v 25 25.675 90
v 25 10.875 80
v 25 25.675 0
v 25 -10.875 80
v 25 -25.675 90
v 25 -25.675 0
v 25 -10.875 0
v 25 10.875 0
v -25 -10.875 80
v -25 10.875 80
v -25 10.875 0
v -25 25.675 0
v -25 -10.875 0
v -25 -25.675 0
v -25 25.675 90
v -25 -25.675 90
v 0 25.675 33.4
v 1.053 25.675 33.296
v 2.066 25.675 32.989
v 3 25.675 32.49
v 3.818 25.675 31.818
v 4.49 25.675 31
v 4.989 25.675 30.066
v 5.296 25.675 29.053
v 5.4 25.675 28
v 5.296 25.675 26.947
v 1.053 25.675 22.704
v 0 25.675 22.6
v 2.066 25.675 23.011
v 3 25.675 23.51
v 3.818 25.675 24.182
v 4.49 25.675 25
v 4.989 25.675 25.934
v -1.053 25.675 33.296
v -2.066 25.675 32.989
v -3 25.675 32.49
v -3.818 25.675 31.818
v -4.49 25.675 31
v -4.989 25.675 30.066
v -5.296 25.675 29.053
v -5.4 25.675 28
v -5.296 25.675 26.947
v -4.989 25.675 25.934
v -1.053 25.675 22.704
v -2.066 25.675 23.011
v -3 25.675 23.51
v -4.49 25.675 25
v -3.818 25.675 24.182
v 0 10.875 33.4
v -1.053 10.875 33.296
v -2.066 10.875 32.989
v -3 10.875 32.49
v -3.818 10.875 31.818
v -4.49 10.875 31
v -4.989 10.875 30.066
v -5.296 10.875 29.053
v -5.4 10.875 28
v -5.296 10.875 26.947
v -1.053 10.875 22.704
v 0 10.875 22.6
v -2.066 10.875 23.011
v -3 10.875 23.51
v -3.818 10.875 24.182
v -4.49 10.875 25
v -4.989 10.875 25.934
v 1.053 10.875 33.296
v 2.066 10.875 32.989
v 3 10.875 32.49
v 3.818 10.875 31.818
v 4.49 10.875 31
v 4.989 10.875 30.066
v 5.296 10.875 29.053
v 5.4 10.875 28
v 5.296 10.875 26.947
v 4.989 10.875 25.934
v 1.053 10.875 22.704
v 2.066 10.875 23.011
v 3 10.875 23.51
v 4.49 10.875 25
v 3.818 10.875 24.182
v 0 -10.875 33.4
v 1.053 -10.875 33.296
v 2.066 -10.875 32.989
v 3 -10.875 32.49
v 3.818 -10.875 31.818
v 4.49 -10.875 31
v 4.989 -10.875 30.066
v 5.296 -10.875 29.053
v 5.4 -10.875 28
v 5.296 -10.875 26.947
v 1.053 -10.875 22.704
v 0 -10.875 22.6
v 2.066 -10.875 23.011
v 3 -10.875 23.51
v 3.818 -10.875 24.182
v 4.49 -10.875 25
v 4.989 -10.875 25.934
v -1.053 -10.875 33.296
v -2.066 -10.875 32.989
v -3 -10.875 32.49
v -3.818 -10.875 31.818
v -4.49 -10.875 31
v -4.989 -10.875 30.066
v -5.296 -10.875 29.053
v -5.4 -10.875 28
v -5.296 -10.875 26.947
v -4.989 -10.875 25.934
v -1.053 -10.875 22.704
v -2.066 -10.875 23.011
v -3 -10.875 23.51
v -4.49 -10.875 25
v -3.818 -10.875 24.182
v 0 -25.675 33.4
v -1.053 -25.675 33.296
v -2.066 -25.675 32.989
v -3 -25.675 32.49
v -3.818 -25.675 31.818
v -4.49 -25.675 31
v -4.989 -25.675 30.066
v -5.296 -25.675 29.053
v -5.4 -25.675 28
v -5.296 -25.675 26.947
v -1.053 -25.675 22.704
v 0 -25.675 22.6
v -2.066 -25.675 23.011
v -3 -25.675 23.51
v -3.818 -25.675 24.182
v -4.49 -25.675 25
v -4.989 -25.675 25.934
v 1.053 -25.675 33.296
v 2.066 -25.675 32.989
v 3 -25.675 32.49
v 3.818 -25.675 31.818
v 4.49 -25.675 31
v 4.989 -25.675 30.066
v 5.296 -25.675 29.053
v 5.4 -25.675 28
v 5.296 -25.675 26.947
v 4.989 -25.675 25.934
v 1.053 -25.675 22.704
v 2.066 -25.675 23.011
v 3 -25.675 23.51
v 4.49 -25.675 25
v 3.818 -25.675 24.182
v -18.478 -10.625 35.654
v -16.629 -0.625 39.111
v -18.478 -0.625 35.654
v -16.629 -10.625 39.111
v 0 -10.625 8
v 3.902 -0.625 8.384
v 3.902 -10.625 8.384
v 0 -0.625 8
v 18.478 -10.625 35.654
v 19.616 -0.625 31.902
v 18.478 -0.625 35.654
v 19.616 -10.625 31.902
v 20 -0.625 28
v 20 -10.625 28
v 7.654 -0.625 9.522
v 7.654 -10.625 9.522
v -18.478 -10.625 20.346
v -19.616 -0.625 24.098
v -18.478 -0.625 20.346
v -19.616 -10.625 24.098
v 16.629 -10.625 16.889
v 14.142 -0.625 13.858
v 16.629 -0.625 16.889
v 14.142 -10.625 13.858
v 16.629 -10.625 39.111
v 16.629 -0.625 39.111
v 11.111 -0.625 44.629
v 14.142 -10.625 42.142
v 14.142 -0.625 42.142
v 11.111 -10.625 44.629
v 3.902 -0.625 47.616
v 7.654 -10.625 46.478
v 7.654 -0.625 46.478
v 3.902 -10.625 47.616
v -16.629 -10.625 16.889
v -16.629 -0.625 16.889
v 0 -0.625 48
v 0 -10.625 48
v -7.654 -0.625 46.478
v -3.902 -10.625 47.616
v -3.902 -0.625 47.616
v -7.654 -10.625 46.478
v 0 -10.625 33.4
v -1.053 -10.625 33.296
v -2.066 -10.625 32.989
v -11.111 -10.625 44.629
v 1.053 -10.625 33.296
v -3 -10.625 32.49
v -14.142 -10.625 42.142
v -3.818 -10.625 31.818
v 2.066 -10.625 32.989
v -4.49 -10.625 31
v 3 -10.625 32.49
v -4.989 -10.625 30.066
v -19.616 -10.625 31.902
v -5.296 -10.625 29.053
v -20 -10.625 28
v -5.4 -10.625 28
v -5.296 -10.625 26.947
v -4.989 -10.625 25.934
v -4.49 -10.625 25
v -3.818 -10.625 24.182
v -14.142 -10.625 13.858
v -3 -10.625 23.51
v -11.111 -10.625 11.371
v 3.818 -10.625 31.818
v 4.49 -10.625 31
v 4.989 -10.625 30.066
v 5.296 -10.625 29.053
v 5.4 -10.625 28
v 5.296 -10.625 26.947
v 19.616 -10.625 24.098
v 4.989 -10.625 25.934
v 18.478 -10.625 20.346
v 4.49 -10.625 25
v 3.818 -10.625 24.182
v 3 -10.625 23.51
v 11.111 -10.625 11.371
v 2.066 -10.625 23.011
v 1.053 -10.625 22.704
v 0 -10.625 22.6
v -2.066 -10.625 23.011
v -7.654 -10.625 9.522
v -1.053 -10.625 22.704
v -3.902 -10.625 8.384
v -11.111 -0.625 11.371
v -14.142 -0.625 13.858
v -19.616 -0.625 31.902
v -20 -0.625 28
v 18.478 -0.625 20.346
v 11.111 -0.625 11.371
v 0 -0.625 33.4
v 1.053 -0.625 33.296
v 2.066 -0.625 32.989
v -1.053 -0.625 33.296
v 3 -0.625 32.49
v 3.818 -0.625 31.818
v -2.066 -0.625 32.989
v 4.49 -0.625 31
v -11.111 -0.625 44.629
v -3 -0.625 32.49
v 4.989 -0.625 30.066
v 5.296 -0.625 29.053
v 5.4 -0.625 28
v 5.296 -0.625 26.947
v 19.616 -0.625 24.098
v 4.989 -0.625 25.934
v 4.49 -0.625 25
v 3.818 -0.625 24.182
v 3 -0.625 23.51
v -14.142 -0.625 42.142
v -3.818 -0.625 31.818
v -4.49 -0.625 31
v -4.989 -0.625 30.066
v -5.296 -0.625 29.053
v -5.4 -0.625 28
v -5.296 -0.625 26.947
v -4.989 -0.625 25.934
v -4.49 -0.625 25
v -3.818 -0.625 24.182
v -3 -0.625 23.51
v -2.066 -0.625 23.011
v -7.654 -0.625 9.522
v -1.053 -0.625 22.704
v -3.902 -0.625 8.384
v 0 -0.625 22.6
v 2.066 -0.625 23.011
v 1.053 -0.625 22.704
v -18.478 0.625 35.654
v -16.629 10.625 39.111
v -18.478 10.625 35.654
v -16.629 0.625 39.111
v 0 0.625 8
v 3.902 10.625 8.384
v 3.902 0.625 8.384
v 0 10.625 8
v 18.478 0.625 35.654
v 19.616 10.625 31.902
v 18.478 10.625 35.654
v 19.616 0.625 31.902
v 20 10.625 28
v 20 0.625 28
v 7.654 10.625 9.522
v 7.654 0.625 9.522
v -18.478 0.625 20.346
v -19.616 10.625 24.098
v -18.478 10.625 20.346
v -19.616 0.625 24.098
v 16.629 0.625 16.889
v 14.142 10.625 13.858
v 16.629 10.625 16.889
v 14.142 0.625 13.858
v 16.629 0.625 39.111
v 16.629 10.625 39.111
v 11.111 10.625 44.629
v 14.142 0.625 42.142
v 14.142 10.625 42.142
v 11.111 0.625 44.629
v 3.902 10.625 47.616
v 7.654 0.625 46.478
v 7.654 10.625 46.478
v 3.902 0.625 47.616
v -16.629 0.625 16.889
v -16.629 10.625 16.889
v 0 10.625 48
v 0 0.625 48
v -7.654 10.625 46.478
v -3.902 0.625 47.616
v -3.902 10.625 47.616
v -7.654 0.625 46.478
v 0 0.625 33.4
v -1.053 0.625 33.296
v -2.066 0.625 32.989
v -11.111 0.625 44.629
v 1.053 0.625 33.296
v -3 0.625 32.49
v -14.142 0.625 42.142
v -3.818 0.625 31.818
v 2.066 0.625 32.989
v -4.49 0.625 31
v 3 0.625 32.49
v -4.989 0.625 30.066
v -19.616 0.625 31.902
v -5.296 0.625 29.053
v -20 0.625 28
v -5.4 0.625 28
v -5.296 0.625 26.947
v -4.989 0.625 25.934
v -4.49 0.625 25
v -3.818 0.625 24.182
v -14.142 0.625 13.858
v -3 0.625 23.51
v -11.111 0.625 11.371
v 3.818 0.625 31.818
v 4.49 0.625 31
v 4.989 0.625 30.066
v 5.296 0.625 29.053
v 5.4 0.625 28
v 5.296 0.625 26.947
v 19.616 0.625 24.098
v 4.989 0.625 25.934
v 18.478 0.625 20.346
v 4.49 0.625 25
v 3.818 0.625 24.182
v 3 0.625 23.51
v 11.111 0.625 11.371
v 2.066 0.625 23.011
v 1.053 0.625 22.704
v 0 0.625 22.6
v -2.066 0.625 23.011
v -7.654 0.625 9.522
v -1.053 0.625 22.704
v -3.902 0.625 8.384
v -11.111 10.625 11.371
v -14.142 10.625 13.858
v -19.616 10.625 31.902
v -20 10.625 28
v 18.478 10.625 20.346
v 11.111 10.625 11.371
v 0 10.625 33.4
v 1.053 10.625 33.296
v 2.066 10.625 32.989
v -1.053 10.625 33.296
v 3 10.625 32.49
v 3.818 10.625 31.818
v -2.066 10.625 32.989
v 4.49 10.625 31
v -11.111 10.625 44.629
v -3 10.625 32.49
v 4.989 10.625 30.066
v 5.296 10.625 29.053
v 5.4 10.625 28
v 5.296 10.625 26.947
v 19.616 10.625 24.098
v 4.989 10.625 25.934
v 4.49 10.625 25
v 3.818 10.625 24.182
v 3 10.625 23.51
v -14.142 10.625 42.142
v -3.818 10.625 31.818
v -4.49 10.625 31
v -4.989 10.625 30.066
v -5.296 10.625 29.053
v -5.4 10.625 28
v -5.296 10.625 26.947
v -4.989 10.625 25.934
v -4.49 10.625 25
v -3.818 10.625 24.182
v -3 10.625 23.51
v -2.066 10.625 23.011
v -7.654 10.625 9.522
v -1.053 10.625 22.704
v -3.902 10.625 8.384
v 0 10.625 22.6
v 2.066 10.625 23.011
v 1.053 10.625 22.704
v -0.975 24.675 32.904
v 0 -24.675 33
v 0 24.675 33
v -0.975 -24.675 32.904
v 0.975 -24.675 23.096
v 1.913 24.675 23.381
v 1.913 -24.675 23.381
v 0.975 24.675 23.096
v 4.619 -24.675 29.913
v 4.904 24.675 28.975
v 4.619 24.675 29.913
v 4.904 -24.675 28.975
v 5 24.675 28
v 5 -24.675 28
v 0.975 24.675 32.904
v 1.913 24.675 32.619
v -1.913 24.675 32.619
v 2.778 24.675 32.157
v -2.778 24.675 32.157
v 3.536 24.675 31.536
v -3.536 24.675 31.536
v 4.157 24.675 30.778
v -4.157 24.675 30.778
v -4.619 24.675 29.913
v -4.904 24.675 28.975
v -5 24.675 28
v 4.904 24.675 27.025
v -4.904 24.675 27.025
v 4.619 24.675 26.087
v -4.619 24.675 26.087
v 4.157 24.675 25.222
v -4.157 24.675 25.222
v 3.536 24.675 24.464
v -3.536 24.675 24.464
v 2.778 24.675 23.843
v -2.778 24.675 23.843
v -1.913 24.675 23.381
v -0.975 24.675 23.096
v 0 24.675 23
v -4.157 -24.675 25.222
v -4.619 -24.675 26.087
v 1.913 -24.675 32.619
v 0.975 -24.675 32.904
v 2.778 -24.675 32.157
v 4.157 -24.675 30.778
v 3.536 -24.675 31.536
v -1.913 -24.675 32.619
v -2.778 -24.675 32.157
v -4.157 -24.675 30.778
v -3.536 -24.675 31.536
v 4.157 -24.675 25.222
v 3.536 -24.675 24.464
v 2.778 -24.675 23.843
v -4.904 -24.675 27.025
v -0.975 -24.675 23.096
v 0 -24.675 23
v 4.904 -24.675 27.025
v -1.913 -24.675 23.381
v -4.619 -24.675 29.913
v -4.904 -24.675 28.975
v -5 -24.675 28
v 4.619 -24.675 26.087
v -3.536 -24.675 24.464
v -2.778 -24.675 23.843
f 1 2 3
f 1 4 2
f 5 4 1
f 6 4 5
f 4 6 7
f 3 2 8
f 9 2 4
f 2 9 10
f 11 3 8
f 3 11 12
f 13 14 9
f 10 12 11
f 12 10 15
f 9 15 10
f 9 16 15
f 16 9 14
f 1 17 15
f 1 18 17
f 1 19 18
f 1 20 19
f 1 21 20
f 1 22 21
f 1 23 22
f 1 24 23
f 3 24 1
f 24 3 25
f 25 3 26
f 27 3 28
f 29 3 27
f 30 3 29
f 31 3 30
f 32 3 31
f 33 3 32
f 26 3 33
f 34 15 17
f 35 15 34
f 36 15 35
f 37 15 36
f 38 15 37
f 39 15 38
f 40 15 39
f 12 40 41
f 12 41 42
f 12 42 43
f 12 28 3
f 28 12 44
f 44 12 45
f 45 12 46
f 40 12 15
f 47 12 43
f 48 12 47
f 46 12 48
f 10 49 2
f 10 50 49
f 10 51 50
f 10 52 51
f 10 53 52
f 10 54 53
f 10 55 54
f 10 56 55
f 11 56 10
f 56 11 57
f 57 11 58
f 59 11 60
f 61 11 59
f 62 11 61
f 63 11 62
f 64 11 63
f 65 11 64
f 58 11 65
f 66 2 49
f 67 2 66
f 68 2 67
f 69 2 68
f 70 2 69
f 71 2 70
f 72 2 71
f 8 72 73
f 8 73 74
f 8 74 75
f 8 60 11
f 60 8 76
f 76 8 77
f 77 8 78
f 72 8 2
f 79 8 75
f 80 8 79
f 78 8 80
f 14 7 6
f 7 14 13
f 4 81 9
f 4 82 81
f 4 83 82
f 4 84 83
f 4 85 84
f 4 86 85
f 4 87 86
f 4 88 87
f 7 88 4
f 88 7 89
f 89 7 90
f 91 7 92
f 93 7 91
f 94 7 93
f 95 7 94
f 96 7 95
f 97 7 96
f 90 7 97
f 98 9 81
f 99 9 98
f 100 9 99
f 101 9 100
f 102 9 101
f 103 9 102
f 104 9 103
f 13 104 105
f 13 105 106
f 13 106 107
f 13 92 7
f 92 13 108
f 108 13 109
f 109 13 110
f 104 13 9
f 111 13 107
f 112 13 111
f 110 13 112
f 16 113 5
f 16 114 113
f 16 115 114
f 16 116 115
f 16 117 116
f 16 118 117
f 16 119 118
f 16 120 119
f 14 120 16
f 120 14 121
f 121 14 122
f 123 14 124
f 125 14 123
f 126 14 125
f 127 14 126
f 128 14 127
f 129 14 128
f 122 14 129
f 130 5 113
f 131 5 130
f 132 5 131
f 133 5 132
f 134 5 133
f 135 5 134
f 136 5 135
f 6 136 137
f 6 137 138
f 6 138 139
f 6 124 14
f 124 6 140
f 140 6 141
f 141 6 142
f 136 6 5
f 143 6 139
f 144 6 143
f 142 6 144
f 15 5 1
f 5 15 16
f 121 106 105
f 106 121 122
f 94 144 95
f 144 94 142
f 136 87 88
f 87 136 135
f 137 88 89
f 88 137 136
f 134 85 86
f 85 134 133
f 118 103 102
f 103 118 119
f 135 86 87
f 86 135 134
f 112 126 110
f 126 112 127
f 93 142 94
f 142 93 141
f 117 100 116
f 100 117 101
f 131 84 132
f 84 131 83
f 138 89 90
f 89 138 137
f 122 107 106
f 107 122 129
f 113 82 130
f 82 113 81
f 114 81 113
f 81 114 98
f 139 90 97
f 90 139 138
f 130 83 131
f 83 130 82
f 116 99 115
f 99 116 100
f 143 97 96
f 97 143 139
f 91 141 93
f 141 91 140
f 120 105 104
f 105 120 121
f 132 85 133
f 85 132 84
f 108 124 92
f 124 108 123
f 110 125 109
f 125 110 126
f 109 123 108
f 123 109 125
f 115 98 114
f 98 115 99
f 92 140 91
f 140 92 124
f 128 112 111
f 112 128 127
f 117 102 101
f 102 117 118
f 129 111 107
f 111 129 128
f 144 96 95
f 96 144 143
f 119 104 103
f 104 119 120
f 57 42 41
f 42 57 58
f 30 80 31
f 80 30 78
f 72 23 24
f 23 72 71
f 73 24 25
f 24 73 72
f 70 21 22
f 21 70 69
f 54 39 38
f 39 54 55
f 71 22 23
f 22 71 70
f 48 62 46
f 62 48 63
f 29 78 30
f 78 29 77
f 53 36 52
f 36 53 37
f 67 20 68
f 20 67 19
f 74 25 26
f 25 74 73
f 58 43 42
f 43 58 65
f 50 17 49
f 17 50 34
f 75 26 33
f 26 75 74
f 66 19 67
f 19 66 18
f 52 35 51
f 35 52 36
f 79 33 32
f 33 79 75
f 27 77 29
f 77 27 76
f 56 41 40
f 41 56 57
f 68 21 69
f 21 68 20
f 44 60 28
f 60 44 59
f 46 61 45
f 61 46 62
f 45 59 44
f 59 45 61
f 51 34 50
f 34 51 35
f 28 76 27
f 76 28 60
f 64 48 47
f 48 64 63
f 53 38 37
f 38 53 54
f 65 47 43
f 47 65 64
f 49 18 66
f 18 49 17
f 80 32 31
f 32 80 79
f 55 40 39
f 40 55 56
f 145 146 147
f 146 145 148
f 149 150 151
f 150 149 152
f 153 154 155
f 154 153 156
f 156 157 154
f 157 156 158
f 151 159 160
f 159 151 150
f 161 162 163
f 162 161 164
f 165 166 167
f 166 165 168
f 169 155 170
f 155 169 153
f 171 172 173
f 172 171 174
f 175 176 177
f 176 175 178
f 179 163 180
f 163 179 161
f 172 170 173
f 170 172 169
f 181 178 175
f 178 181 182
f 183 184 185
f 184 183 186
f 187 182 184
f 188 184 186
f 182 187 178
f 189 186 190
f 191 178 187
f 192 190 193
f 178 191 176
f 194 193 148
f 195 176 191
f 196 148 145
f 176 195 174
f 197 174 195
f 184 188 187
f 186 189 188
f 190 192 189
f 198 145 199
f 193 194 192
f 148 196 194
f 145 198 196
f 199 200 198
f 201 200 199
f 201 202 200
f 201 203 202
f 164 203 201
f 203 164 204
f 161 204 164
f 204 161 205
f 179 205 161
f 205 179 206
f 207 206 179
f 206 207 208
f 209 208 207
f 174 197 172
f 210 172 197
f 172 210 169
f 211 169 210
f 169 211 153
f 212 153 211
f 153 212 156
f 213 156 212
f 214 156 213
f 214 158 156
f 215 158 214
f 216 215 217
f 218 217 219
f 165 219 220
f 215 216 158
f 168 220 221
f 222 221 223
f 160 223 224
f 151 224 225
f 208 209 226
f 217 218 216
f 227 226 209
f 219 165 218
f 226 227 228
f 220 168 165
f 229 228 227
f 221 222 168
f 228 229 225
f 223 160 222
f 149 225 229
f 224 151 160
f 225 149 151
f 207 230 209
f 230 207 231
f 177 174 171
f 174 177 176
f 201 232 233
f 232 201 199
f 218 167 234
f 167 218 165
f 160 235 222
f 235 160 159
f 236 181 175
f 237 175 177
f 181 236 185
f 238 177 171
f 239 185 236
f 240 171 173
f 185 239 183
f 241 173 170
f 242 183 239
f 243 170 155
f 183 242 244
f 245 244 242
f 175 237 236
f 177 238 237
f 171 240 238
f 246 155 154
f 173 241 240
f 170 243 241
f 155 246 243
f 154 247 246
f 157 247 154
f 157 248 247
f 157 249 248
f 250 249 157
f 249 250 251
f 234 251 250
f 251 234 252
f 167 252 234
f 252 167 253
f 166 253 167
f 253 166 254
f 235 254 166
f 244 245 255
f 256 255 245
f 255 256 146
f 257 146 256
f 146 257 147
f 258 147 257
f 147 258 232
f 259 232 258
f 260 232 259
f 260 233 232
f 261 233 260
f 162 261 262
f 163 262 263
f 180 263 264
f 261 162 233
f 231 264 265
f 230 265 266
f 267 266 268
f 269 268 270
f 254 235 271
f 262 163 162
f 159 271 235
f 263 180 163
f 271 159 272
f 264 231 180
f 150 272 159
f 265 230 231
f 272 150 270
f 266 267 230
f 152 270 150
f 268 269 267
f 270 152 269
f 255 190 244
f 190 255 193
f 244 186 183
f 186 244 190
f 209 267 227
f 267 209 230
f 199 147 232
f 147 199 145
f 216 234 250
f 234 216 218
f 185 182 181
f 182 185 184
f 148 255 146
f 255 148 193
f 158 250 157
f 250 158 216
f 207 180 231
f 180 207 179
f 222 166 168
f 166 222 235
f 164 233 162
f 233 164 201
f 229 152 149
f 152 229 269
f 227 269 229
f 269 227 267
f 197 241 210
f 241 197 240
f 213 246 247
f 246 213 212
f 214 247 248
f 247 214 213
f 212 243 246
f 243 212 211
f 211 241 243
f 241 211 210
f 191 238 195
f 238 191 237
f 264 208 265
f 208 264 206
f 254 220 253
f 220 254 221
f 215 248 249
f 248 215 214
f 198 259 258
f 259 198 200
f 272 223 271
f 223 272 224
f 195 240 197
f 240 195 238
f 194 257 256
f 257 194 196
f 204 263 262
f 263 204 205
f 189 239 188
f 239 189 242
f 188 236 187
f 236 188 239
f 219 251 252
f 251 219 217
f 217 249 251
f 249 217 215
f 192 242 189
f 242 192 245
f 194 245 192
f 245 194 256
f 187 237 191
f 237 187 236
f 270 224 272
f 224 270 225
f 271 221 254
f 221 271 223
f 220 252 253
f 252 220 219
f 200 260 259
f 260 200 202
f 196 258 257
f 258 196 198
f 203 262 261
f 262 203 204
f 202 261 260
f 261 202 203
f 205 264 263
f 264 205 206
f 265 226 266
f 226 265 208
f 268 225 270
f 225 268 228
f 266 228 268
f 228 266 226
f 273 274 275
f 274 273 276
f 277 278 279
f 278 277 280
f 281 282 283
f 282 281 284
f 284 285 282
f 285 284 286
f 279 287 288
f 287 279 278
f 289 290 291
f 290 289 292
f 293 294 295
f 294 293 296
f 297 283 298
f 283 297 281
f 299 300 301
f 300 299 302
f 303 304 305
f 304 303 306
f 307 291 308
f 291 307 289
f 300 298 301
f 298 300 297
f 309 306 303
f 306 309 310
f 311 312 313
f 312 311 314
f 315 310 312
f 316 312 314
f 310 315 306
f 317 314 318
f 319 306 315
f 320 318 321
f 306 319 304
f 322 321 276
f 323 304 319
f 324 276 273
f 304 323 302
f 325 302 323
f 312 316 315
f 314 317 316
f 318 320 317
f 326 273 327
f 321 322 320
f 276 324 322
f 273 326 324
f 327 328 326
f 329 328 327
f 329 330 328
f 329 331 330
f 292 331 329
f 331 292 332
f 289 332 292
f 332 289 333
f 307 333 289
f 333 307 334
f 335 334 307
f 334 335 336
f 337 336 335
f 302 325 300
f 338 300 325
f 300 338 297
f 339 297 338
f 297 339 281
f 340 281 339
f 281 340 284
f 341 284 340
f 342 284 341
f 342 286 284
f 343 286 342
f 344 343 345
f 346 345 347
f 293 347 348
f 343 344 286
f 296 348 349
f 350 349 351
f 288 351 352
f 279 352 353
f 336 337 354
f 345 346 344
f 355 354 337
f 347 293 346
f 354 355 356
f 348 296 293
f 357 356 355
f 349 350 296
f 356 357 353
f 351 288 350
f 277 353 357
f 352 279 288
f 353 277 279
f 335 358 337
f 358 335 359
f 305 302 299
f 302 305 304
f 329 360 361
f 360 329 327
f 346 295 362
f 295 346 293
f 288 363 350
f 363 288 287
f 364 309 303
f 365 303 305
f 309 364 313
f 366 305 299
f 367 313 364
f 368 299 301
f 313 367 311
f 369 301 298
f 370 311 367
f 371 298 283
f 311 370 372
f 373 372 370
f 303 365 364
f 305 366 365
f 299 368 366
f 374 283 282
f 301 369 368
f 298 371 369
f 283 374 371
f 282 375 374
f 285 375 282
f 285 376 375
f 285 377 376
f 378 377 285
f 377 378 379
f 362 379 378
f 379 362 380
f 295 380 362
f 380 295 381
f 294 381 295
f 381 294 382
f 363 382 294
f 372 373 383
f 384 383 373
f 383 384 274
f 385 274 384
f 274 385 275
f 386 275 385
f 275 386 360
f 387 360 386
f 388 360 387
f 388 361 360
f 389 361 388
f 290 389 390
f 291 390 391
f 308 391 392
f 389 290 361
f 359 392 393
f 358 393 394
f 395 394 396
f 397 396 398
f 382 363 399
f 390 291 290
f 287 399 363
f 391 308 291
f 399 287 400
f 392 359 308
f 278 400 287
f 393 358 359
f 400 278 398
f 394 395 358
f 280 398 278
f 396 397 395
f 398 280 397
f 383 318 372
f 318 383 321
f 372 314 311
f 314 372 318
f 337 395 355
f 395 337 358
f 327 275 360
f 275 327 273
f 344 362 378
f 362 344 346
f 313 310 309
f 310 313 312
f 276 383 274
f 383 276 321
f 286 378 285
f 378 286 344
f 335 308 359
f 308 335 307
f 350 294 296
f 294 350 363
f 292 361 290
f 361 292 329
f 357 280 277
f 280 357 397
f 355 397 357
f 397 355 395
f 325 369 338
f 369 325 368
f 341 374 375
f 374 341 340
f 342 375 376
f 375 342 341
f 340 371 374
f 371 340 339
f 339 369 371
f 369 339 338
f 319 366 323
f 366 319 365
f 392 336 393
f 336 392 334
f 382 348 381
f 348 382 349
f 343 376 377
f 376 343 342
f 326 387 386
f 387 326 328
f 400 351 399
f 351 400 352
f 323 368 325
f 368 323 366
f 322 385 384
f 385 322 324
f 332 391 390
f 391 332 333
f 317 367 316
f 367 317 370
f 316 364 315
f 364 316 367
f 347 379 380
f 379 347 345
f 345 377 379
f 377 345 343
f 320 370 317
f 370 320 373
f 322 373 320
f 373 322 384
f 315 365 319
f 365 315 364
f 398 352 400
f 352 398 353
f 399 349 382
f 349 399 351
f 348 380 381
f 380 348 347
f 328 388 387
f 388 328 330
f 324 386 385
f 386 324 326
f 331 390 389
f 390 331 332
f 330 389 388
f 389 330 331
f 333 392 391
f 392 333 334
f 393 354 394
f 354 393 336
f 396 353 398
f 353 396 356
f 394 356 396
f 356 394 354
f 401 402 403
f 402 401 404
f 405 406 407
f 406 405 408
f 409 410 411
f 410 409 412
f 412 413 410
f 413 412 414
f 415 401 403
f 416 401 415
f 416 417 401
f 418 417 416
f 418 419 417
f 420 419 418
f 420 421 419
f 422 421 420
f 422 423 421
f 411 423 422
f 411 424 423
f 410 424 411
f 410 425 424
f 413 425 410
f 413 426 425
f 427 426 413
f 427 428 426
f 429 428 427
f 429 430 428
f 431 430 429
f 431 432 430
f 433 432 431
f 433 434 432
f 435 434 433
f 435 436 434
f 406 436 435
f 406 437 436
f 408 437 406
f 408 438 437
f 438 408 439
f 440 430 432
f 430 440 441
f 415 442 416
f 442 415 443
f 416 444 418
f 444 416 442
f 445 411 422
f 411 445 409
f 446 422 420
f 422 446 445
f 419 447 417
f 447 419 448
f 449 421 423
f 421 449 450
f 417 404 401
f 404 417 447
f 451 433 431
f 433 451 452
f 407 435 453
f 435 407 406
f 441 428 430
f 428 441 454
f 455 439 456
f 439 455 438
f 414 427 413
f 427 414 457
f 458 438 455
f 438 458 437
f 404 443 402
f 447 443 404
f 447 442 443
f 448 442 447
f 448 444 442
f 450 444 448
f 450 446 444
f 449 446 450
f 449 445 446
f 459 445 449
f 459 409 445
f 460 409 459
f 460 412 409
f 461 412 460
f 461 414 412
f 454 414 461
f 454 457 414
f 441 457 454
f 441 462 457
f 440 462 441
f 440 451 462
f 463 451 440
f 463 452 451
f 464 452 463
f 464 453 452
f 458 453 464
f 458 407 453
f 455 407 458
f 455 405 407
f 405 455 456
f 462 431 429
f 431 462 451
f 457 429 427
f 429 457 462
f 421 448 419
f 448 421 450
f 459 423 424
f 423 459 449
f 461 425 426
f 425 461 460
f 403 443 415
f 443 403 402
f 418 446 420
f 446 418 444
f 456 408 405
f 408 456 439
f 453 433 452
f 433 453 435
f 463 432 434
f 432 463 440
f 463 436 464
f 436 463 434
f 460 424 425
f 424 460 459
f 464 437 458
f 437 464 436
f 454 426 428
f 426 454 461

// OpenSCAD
$fn = 32;

// ------------------------------------------------------------------------
// Trolley wheel set: wheels d40, fork 80 mm tall
// Every part is its own module, assembly() places every instance.
// ------------------------------------------------------------------------

// --- part 1 ---
module trolley_fork() {
  difference() {
    union() {
      translate([-25, 10.875, 0]) cube([50, 14.8, 80]);
      translate([-25, -25.675, 0]) cube([50, 14.8, 80]);
      translate([-25, -25.675, 80]) cube([50, 51.35, 10]);
    }
    translate([0, -18.275, 28]) rotate([90, 0, 0]) cylinder(h = 16.8, d = 10.8, center = true);
    translate([0, 18.275, 28]) rotate([90, 0, 0]) cylinder(h = 16.8, d = 10.8, center = true);
  }
}

// --- part 2 ---
module trolley_wheel() {
  difference() {
      translate([0, 0, 0]) cylinder(h = 10, d = 40);
      translate([0, 0, -1]) cylinder(h = 12, d = 10.8);
    }
}

// --- part 3 ---
module trolley_axle() {
  translate([0, 0, -24.675]) cylinder(h = 49.35, d = 10);
}

// --- assembly ---
module assembly() {
  color([0.80, 0.24, 0.20]) translate([0, 0, 0]) rotate([0, 0, 0]) trolley_fork();
  color([0.20, 0.45, 0.75]) translate([0, -0.625, 28]) rotate([90, 0, 0]) trolley_wheel();
  color([0.25, 0.62, 0.32]) translate([0, 10.625, 28]) rotate([90, 0, 0]) trolley_wheel();
  color([0.92, 0.70, 0.18]) translate([0, 0, 28]) rotate([90, 0, 0]) trolley_axle();
}

assembly();
